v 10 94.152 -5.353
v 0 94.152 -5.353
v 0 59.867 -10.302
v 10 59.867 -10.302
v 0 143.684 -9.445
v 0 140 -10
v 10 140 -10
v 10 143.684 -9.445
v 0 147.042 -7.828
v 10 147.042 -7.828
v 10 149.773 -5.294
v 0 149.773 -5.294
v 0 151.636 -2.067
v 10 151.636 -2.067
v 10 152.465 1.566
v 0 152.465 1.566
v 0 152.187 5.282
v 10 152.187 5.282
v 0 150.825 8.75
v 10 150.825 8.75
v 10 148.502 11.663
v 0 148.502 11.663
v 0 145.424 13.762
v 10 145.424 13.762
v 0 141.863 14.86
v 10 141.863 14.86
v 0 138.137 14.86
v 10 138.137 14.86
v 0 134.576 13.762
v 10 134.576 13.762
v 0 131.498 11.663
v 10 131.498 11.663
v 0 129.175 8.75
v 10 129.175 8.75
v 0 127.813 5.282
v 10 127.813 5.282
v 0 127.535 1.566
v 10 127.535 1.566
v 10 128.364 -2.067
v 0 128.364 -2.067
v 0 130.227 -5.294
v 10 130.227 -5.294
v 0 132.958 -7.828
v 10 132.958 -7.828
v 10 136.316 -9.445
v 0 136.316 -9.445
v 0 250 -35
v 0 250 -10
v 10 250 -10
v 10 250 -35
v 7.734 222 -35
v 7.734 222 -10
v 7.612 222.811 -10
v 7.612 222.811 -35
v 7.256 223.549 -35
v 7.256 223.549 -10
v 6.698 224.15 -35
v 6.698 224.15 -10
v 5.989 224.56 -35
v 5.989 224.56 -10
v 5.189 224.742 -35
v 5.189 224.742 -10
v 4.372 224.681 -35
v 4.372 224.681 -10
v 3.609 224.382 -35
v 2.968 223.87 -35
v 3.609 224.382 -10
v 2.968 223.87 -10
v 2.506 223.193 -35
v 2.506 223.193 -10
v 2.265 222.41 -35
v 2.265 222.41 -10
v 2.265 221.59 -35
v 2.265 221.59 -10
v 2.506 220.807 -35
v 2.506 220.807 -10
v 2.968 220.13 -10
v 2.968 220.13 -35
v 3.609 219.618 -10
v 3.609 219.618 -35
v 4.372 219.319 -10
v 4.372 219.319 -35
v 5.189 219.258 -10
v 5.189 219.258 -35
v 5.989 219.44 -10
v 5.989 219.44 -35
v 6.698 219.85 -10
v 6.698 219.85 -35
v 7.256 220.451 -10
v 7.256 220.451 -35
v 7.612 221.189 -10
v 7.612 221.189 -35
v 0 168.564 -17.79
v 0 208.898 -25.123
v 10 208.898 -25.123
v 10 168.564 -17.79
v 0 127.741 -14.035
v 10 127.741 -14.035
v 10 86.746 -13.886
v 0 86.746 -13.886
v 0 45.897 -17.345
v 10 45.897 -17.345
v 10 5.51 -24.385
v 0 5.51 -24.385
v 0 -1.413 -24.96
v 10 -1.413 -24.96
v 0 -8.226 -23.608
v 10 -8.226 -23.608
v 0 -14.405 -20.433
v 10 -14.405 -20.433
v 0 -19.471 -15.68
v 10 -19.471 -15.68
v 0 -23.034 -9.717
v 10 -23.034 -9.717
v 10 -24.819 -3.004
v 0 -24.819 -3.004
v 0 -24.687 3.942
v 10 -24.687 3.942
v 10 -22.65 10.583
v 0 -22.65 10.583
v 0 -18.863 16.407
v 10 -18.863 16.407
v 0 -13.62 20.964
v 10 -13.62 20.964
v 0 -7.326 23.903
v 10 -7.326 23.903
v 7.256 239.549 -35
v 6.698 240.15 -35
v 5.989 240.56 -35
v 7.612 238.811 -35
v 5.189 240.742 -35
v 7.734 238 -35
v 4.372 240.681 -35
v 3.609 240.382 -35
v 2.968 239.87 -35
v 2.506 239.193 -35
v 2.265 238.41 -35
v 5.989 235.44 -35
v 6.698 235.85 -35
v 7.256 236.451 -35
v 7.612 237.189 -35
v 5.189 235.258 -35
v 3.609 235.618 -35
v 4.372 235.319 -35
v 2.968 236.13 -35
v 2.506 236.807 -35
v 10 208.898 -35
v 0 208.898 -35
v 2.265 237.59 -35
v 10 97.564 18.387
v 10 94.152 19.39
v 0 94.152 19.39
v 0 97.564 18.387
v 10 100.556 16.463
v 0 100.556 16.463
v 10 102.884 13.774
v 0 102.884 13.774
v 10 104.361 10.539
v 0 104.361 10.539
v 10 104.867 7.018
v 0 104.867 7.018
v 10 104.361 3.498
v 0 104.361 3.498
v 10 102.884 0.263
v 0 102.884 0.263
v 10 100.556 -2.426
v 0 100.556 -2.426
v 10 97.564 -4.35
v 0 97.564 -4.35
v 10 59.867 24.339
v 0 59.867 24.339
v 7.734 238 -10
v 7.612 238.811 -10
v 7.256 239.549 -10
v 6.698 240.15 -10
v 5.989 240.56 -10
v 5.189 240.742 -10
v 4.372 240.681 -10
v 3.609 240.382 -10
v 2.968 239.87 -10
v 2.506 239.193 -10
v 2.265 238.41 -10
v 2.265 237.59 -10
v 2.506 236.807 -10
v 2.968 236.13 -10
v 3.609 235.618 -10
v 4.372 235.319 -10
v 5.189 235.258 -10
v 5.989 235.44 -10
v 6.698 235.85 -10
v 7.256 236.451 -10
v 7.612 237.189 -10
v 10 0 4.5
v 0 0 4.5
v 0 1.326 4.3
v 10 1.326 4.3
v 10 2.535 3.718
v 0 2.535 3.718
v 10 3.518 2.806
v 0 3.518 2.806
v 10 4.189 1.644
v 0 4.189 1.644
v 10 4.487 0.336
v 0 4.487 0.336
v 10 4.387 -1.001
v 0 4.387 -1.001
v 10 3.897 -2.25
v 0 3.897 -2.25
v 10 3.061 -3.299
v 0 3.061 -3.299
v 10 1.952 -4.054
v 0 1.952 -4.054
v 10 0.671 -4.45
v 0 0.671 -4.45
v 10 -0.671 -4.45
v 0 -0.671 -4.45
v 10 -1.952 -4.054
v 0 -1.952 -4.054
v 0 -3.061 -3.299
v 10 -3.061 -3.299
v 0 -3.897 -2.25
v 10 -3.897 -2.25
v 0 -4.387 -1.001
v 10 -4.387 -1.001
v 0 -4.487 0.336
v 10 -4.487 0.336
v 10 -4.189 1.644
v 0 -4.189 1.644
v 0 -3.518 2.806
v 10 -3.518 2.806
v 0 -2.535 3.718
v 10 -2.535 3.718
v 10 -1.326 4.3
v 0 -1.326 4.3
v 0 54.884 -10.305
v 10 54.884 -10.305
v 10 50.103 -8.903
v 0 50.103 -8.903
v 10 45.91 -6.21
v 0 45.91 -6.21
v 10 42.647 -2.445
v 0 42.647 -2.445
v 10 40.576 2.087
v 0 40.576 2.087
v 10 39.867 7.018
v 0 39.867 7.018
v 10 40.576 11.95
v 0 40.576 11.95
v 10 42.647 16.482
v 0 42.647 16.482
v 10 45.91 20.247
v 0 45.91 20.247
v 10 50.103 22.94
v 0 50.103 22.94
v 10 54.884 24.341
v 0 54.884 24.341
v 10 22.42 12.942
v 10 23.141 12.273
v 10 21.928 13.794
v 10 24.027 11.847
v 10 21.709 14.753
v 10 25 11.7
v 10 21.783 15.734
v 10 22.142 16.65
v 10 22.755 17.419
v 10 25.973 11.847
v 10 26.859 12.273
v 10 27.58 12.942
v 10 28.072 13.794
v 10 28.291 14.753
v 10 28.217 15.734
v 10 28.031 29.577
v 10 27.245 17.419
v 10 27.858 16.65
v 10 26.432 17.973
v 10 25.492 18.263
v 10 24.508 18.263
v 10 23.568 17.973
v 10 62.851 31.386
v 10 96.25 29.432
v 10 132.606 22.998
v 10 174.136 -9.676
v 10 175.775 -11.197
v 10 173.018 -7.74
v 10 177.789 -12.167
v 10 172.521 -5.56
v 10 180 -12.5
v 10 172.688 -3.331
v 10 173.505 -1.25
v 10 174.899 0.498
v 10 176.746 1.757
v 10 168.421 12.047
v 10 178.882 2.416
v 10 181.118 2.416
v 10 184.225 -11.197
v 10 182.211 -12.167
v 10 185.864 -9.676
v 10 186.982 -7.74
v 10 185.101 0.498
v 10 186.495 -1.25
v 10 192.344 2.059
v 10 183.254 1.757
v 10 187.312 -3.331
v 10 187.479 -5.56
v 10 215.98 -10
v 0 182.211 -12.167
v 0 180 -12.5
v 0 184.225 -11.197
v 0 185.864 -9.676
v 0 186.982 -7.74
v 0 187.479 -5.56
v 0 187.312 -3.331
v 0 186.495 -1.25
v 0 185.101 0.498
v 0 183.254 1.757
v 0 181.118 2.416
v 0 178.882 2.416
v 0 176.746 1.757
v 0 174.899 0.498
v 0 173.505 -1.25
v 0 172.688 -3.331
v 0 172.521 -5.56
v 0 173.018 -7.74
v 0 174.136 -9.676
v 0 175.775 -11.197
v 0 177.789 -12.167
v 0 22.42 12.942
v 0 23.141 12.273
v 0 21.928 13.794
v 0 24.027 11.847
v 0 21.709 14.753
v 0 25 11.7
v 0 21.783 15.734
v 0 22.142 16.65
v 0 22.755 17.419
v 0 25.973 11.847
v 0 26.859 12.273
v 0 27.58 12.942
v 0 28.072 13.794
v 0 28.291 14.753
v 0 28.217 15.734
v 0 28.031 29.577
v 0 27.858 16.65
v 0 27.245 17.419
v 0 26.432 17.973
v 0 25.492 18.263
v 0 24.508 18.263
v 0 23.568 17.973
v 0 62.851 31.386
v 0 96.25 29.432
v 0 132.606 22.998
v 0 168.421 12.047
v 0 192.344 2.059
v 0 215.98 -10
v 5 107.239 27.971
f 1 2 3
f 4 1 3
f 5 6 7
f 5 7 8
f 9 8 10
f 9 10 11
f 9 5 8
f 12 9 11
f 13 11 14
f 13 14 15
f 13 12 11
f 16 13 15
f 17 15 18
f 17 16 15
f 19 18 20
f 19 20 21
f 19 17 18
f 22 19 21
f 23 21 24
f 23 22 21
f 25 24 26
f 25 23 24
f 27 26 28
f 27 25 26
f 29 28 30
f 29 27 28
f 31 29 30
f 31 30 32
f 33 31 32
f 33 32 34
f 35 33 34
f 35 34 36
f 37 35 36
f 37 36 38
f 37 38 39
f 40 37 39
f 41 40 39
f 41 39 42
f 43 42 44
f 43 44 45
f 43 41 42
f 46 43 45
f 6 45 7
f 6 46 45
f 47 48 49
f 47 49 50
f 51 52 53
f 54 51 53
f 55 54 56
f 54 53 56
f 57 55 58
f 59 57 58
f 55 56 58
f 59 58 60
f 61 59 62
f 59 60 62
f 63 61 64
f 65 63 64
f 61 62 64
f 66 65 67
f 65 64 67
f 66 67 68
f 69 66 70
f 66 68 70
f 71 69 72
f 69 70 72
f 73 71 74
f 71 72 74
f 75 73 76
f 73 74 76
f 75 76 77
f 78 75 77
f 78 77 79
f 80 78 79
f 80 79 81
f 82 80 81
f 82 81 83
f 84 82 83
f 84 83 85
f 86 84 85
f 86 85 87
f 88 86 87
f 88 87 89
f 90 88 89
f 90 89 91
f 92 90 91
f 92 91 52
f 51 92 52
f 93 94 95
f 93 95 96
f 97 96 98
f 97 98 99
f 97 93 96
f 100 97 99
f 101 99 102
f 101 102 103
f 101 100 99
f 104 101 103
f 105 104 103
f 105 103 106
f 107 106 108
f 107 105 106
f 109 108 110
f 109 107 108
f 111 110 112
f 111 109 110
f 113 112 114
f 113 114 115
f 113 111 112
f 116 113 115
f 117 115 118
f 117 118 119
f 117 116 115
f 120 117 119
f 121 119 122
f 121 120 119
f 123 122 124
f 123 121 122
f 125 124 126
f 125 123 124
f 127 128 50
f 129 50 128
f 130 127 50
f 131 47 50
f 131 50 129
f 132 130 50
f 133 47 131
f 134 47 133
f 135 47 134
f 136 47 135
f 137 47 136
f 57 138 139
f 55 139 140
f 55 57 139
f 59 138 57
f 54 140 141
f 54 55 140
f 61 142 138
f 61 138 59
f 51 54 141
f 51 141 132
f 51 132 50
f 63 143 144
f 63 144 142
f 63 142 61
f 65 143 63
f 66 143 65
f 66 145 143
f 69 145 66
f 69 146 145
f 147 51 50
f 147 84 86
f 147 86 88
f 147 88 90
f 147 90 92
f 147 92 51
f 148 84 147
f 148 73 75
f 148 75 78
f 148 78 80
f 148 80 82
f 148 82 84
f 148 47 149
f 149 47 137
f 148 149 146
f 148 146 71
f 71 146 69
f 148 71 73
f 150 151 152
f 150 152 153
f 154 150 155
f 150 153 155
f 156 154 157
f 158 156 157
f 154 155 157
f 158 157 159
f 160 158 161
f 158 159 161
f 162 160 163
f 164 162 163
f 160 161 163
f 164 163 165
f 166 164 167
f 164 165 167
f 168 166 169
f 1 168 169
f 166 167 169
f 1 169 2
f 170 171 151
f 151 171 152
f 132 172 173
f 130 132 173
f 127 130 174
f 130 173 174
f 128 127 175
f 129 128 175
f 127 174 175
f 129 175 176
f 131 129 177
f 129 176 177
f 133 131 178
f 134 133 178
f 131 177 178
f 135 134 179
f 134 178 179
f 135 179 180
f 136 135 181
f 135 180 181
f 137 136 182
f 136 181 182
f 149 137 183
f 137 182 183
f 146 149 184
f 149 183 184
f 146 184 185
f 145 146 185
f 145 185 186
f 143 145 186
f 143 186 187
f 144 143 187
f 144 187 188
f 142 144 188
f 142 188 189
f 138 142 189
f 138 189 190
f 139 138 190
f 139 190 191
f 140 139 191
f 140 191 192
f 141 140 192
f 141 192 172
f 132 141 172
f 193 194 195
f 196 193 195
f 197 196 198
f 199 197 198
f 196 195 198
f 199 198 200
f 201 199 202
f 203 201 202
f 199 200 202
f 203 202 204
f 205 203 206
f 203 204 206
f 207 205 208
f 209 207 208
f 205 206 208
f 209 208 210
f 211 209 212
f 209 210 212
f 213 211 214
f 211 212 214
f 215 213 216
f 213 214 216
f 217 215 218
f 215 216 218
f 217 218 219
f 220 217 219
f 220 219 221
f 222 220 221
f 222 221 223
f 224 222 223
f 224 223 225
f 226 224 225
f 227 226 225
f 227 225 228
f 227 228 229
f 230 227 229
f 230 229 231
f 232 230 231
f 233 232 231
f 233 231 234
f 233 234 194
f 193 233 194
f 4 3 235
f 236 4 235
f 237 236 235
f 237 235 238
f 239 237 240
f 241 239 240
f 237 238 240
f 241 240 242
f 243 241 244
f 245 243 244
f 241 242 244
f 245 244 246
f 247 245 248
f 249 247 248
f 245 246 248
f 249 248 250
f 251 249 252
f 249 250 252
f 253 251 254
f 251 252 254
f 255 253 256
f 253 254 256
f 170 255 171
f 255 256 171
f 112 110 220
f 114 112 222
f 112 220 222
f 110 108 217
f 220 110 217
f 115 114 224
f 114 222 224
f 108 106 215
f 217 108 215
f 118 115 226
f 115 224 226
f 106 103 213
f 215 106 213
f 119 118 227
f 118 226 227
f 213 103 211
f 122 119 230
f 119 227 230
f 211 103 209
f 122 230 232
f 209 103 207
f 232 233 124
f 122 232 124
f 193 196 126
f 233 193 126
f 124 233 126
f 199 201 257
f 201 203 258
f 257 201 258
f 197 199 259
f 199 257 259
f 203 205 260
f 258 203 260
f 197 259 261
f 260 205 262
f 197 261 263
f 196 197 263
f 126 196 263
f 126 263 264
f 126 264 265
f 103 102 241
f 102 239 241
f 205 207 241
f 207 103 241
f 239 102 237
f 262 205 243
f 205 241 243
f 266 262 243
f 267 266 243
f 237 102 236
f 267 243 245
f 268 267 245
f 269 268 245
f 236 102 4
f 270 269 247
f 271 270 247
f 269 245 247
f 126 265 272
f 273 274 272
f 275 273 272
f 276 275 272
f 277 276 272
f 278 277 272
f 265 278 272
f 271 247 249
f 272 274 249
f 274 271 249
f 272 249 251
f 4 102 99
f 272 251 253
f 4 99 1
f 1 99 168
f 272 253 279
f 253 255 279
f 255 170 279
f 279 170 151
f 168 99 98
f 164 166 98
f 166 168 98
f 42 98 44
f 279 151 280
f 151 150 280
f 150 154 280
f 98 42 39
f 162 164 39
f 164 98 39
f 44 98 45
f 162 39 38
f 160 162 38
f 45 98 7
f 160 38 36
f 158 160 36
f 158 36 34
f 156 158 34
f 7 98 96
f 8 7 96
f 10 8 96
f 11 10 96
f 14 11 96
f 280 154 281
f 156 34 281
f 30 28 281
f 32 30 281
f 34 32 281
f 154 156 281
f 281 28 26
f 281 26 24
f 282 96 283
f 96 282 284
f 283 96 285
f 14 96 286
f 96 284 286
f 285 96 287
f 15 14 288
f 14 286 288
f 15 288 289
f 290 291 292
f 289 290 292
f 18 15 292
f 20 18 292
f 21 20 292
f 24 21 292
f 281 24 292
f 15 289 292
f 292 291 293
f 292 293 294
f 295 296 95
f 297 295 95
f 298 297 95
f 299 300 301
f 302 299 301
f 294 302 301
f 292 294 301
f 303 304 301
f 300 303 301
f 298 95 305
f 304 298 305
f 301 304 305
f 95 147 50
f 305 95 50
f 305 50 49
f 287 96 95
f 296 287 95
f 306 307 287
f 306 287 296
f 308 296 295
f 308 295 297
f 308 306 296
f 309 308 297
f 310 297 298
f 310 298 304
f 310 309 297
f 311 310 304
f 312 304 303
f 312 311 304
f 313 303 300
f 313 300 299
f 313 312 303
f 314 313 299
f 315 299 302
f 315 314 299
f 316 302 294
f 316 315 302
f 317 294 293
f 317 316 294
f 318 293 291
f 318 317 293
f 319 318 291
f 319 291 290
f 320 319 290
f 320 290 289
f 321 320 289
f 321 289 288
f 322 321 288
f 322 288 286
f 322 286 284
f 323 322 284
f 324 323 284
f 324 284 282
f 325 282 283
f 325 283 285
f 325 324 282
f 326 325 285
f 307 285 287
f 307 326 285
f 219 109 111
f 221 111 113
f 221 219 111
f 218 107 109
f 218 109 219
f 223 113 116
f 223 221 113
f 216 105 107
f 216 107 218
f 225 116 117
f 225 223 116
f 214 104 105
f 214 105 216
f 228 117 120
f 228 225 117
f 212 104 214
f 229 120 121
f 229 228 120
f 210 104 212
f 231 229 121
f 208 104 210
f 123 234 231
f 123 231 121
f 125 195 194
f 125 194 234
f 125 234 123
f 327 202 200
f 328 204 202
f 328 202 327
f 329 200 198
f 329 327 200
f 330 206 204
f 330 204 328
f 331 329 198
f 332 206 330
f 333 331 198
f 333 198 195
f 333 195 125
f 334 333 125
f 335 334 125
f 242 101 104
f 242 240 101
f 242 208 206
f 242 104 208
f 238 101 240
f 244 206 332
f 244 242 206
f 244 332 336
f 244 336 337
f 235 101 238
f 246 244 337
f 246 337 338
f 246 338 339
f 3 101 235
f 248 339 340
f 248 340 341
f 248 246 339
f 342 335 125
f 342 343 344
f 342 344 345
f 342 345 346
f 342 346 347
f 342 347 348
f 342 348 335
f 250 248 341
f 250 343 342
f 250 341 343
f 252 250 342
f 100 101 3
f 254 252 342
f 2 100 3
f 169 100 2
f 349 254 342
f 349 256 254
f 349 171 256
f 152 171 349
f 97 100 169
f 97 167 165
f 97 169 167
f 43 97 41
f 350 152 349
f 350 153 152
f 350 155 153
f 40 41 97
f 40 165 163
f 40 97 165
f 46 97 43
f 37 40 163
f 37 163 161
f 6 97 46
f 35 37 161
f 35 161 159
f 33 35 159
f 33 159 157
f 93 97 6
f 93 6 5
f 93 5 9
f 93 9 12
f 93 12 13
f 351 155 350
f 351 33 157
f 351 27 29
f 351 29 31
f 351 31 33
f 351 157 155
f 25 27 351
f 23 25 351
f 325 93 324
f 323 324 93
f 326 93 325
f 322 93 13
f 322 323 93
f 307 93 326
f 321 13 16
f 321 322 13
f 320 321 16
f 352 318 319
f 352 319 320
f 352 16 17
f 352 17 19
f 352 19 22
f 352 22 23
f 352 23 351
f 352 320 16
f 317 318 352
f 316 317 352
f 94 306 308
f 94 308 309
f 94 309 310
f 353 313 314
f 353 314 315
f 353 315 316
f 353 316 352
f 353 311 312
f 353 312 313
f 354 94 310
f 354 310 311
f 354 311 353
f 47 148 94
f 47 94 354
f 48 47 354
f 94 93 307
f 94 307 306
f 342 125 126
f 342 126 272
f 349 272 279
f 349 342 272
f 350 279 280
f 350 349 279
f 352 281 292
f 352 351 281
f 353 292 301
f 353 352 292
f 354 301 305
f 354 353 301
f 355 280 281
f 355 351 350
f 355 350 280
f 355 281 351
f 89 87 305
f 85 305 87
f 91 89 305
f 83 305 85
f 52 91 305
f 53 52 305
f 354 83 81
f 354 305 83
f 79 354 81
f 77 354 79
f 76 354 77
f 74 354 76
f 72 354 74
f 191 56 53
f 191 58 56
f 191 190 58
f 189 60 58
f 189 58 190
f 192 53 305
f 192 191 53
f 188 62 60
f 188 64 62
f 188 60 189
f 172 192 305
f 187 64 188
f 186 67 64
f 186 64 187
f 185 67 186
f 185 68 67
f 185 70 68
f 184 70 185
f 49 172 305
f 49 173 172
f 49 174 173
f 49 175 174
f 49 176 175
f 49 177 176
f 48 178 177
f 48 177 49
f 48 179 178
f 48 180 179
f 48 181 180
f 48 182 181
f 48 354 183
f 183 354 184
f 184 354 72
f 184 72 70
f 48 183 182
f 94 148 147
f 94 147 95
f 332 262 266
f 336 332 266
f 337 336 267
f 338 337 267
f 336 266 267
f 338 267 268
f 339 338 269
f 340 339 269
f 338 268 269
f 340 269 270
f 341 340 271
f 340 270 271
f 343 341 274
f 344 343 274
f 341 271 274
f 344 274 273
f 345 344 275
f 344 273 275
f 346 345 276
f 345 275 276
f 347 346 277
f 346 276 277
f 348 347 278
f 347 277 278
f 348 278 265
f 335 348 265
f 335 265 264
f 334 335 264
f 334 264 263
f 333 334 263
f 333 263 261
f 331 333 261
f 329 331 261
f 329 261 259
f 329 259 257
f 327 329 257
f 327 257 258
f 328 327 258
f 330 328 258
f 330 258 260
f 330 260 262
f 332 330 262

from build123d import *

# Parameters (mm, degrees)
SKETCH1_R                = 7.5
SKETCH1_R_2              = 12.5
BOSS_EXTRUDE1_DEPTH      = 10
M5_CLEARANCE_HOLE2_D     = 5.5
M5_CLEARANCE_HOLE2_DEPTH = 30
M5_CLEARANCE_HOLE2_TIP   = 1.652366702
M8_CLEARANCE_HOLE1_D     = 9
M8_CLEARANCE_HOLE1_DEPTH = 30
M8_CLEARANCE_HOLE1_TIP   = 2.703872786
M6_CLEARANCE_HOLE1_D     = 6.6
M6_CLEARANCE_HOLE1_DEPTH = 30
M6_CLEARANCE_HOLE1_TIP   = 1.982840043


with BuildPart() as part:
    # Sketch1 → Boss-Extrude1 (new body)
    with BuildSketch(Plane(origin=(0, 0, 0), x_dir=(0, 0, -1), z_dir=(1, 0, 0))):
        with BuildLine():
            Line((10, 215.979685497), (10, 250))
            Line((10, 250), (25, 250))
            Line((25, 250), (35, 250))
            Line((35, 250), (35, 208.897946033))
            Line((35, 208.897946033), (25.122964317, 208.897946033))
            ThreePointArc((25.122964317, 208.897946033), (13.508598299, 107.244900729), (24.385178415, 5.510269837))
            ThreePointArc((24.385178415, 5.510269837), (6.422608809, -24.160920845), (-23.902542108, -7.325877476))
            add(Edge.make_bspline(
                [(-23.902542108, -7.325877476), (-48.990185726, 110.151133061), (10, 215.979685497)],
                knots=[0, 0, 0, 1, 1, 1], degree=2))
        make_face()
        with Locations((5, 180)):
            Circle(SKETCH1_R, mode=Mode.SUBTRACT)
        with Locations((-2.5, 140)):
            Circle(SKETCH1_R_2, mode=Mode.SUBTRACT)
        with BuildLine():
            Line((-24.338949666, 59.866716225), (-19.390233073, 94.152430511))
            ThreePointArc((-19.390233073, 94.152430511), (-7.01844159, 104.866716225), (5.353349892, 94.152430511))
            Line((5.353349892, 94.152430511), (10.302066485, 59.866716225))
            ThreePointArc((10.302066485, 59.866716225), (-7.01844159, 39.866716225), (-24.338949666, 59.866716225))
        make_face(mode=Mode.SUBTRACT)
    extrude(amount=BOSS_EXTRUDE1_DEPTH)

    # M5 Clearance Hole2
    with Locations(Plane(origin=(0, 0, -35), x_dir=(-1, 0, 0), z_dir=(0, 0, -1))):
        with Locations((-4.98385201, 238), (-4.98385201, 222)):
            Hole(M5_CLEARANCE_HOLE2_D / 2, depth=M5_CLEARANCE_HOLE2_DEPTH)
            with Locations((0, 0, -(M5_CLEARANCE_HOLE2_DEPTH + M5_CLEARANCE_HOLE2_TIP / 2))):  # 118° drill point
                Cone(0, M5_CLEARANCE_HOLE2_D / 2, M5_CLEARANCE_HOLE2_TIP, mode=Mode.SUBTRACT)

    # M8 Clearance Hole1
    with Locations(Plane(origin=(10, 0, 0), x_dir=(0, 0, -1), z_dir=(1, 0, 0))):
        with Locations((0, 0)):
            Hole(M8_CLEARANCE_HOLE1_D / 2, depth=M8_CLEARANCE_HOLE1_DEPTH)
            with Locations((0, 0, -(M8_CLEARANCE_HOLE1_DEPTH + M8_CLEARANCE_HOLE1_TIP / 2))):  # 118° drill point
                Cone(0, M8_CLEARANCE_HOLE1_D / 2, M8_CLEARANCE_HOLE1_TIP, mode=Mode.SUBTRACT)

    # M6 Clearance Hole1
    with Locations(Plane.ZY):
        with Locations((15, 25)):
            Hole(M6_CLEARANCE_HOLE1_D / 2, depth=M6_CLEARANCE_HOLE1_DEPTH)
            with Locations((0, 0, -(M6_CLEARANCE_HOLE1_DEPTH + M6_CLEARANCE_HOLE1_TIP / 2))):  # 118° drill point
                Cone(0, M6_CLEARANCE_HOLE1_D / 2, M6_CLEARANCE_HOLE1_TIP, mode=Mode.SUBTRACT)


solid = part.part
